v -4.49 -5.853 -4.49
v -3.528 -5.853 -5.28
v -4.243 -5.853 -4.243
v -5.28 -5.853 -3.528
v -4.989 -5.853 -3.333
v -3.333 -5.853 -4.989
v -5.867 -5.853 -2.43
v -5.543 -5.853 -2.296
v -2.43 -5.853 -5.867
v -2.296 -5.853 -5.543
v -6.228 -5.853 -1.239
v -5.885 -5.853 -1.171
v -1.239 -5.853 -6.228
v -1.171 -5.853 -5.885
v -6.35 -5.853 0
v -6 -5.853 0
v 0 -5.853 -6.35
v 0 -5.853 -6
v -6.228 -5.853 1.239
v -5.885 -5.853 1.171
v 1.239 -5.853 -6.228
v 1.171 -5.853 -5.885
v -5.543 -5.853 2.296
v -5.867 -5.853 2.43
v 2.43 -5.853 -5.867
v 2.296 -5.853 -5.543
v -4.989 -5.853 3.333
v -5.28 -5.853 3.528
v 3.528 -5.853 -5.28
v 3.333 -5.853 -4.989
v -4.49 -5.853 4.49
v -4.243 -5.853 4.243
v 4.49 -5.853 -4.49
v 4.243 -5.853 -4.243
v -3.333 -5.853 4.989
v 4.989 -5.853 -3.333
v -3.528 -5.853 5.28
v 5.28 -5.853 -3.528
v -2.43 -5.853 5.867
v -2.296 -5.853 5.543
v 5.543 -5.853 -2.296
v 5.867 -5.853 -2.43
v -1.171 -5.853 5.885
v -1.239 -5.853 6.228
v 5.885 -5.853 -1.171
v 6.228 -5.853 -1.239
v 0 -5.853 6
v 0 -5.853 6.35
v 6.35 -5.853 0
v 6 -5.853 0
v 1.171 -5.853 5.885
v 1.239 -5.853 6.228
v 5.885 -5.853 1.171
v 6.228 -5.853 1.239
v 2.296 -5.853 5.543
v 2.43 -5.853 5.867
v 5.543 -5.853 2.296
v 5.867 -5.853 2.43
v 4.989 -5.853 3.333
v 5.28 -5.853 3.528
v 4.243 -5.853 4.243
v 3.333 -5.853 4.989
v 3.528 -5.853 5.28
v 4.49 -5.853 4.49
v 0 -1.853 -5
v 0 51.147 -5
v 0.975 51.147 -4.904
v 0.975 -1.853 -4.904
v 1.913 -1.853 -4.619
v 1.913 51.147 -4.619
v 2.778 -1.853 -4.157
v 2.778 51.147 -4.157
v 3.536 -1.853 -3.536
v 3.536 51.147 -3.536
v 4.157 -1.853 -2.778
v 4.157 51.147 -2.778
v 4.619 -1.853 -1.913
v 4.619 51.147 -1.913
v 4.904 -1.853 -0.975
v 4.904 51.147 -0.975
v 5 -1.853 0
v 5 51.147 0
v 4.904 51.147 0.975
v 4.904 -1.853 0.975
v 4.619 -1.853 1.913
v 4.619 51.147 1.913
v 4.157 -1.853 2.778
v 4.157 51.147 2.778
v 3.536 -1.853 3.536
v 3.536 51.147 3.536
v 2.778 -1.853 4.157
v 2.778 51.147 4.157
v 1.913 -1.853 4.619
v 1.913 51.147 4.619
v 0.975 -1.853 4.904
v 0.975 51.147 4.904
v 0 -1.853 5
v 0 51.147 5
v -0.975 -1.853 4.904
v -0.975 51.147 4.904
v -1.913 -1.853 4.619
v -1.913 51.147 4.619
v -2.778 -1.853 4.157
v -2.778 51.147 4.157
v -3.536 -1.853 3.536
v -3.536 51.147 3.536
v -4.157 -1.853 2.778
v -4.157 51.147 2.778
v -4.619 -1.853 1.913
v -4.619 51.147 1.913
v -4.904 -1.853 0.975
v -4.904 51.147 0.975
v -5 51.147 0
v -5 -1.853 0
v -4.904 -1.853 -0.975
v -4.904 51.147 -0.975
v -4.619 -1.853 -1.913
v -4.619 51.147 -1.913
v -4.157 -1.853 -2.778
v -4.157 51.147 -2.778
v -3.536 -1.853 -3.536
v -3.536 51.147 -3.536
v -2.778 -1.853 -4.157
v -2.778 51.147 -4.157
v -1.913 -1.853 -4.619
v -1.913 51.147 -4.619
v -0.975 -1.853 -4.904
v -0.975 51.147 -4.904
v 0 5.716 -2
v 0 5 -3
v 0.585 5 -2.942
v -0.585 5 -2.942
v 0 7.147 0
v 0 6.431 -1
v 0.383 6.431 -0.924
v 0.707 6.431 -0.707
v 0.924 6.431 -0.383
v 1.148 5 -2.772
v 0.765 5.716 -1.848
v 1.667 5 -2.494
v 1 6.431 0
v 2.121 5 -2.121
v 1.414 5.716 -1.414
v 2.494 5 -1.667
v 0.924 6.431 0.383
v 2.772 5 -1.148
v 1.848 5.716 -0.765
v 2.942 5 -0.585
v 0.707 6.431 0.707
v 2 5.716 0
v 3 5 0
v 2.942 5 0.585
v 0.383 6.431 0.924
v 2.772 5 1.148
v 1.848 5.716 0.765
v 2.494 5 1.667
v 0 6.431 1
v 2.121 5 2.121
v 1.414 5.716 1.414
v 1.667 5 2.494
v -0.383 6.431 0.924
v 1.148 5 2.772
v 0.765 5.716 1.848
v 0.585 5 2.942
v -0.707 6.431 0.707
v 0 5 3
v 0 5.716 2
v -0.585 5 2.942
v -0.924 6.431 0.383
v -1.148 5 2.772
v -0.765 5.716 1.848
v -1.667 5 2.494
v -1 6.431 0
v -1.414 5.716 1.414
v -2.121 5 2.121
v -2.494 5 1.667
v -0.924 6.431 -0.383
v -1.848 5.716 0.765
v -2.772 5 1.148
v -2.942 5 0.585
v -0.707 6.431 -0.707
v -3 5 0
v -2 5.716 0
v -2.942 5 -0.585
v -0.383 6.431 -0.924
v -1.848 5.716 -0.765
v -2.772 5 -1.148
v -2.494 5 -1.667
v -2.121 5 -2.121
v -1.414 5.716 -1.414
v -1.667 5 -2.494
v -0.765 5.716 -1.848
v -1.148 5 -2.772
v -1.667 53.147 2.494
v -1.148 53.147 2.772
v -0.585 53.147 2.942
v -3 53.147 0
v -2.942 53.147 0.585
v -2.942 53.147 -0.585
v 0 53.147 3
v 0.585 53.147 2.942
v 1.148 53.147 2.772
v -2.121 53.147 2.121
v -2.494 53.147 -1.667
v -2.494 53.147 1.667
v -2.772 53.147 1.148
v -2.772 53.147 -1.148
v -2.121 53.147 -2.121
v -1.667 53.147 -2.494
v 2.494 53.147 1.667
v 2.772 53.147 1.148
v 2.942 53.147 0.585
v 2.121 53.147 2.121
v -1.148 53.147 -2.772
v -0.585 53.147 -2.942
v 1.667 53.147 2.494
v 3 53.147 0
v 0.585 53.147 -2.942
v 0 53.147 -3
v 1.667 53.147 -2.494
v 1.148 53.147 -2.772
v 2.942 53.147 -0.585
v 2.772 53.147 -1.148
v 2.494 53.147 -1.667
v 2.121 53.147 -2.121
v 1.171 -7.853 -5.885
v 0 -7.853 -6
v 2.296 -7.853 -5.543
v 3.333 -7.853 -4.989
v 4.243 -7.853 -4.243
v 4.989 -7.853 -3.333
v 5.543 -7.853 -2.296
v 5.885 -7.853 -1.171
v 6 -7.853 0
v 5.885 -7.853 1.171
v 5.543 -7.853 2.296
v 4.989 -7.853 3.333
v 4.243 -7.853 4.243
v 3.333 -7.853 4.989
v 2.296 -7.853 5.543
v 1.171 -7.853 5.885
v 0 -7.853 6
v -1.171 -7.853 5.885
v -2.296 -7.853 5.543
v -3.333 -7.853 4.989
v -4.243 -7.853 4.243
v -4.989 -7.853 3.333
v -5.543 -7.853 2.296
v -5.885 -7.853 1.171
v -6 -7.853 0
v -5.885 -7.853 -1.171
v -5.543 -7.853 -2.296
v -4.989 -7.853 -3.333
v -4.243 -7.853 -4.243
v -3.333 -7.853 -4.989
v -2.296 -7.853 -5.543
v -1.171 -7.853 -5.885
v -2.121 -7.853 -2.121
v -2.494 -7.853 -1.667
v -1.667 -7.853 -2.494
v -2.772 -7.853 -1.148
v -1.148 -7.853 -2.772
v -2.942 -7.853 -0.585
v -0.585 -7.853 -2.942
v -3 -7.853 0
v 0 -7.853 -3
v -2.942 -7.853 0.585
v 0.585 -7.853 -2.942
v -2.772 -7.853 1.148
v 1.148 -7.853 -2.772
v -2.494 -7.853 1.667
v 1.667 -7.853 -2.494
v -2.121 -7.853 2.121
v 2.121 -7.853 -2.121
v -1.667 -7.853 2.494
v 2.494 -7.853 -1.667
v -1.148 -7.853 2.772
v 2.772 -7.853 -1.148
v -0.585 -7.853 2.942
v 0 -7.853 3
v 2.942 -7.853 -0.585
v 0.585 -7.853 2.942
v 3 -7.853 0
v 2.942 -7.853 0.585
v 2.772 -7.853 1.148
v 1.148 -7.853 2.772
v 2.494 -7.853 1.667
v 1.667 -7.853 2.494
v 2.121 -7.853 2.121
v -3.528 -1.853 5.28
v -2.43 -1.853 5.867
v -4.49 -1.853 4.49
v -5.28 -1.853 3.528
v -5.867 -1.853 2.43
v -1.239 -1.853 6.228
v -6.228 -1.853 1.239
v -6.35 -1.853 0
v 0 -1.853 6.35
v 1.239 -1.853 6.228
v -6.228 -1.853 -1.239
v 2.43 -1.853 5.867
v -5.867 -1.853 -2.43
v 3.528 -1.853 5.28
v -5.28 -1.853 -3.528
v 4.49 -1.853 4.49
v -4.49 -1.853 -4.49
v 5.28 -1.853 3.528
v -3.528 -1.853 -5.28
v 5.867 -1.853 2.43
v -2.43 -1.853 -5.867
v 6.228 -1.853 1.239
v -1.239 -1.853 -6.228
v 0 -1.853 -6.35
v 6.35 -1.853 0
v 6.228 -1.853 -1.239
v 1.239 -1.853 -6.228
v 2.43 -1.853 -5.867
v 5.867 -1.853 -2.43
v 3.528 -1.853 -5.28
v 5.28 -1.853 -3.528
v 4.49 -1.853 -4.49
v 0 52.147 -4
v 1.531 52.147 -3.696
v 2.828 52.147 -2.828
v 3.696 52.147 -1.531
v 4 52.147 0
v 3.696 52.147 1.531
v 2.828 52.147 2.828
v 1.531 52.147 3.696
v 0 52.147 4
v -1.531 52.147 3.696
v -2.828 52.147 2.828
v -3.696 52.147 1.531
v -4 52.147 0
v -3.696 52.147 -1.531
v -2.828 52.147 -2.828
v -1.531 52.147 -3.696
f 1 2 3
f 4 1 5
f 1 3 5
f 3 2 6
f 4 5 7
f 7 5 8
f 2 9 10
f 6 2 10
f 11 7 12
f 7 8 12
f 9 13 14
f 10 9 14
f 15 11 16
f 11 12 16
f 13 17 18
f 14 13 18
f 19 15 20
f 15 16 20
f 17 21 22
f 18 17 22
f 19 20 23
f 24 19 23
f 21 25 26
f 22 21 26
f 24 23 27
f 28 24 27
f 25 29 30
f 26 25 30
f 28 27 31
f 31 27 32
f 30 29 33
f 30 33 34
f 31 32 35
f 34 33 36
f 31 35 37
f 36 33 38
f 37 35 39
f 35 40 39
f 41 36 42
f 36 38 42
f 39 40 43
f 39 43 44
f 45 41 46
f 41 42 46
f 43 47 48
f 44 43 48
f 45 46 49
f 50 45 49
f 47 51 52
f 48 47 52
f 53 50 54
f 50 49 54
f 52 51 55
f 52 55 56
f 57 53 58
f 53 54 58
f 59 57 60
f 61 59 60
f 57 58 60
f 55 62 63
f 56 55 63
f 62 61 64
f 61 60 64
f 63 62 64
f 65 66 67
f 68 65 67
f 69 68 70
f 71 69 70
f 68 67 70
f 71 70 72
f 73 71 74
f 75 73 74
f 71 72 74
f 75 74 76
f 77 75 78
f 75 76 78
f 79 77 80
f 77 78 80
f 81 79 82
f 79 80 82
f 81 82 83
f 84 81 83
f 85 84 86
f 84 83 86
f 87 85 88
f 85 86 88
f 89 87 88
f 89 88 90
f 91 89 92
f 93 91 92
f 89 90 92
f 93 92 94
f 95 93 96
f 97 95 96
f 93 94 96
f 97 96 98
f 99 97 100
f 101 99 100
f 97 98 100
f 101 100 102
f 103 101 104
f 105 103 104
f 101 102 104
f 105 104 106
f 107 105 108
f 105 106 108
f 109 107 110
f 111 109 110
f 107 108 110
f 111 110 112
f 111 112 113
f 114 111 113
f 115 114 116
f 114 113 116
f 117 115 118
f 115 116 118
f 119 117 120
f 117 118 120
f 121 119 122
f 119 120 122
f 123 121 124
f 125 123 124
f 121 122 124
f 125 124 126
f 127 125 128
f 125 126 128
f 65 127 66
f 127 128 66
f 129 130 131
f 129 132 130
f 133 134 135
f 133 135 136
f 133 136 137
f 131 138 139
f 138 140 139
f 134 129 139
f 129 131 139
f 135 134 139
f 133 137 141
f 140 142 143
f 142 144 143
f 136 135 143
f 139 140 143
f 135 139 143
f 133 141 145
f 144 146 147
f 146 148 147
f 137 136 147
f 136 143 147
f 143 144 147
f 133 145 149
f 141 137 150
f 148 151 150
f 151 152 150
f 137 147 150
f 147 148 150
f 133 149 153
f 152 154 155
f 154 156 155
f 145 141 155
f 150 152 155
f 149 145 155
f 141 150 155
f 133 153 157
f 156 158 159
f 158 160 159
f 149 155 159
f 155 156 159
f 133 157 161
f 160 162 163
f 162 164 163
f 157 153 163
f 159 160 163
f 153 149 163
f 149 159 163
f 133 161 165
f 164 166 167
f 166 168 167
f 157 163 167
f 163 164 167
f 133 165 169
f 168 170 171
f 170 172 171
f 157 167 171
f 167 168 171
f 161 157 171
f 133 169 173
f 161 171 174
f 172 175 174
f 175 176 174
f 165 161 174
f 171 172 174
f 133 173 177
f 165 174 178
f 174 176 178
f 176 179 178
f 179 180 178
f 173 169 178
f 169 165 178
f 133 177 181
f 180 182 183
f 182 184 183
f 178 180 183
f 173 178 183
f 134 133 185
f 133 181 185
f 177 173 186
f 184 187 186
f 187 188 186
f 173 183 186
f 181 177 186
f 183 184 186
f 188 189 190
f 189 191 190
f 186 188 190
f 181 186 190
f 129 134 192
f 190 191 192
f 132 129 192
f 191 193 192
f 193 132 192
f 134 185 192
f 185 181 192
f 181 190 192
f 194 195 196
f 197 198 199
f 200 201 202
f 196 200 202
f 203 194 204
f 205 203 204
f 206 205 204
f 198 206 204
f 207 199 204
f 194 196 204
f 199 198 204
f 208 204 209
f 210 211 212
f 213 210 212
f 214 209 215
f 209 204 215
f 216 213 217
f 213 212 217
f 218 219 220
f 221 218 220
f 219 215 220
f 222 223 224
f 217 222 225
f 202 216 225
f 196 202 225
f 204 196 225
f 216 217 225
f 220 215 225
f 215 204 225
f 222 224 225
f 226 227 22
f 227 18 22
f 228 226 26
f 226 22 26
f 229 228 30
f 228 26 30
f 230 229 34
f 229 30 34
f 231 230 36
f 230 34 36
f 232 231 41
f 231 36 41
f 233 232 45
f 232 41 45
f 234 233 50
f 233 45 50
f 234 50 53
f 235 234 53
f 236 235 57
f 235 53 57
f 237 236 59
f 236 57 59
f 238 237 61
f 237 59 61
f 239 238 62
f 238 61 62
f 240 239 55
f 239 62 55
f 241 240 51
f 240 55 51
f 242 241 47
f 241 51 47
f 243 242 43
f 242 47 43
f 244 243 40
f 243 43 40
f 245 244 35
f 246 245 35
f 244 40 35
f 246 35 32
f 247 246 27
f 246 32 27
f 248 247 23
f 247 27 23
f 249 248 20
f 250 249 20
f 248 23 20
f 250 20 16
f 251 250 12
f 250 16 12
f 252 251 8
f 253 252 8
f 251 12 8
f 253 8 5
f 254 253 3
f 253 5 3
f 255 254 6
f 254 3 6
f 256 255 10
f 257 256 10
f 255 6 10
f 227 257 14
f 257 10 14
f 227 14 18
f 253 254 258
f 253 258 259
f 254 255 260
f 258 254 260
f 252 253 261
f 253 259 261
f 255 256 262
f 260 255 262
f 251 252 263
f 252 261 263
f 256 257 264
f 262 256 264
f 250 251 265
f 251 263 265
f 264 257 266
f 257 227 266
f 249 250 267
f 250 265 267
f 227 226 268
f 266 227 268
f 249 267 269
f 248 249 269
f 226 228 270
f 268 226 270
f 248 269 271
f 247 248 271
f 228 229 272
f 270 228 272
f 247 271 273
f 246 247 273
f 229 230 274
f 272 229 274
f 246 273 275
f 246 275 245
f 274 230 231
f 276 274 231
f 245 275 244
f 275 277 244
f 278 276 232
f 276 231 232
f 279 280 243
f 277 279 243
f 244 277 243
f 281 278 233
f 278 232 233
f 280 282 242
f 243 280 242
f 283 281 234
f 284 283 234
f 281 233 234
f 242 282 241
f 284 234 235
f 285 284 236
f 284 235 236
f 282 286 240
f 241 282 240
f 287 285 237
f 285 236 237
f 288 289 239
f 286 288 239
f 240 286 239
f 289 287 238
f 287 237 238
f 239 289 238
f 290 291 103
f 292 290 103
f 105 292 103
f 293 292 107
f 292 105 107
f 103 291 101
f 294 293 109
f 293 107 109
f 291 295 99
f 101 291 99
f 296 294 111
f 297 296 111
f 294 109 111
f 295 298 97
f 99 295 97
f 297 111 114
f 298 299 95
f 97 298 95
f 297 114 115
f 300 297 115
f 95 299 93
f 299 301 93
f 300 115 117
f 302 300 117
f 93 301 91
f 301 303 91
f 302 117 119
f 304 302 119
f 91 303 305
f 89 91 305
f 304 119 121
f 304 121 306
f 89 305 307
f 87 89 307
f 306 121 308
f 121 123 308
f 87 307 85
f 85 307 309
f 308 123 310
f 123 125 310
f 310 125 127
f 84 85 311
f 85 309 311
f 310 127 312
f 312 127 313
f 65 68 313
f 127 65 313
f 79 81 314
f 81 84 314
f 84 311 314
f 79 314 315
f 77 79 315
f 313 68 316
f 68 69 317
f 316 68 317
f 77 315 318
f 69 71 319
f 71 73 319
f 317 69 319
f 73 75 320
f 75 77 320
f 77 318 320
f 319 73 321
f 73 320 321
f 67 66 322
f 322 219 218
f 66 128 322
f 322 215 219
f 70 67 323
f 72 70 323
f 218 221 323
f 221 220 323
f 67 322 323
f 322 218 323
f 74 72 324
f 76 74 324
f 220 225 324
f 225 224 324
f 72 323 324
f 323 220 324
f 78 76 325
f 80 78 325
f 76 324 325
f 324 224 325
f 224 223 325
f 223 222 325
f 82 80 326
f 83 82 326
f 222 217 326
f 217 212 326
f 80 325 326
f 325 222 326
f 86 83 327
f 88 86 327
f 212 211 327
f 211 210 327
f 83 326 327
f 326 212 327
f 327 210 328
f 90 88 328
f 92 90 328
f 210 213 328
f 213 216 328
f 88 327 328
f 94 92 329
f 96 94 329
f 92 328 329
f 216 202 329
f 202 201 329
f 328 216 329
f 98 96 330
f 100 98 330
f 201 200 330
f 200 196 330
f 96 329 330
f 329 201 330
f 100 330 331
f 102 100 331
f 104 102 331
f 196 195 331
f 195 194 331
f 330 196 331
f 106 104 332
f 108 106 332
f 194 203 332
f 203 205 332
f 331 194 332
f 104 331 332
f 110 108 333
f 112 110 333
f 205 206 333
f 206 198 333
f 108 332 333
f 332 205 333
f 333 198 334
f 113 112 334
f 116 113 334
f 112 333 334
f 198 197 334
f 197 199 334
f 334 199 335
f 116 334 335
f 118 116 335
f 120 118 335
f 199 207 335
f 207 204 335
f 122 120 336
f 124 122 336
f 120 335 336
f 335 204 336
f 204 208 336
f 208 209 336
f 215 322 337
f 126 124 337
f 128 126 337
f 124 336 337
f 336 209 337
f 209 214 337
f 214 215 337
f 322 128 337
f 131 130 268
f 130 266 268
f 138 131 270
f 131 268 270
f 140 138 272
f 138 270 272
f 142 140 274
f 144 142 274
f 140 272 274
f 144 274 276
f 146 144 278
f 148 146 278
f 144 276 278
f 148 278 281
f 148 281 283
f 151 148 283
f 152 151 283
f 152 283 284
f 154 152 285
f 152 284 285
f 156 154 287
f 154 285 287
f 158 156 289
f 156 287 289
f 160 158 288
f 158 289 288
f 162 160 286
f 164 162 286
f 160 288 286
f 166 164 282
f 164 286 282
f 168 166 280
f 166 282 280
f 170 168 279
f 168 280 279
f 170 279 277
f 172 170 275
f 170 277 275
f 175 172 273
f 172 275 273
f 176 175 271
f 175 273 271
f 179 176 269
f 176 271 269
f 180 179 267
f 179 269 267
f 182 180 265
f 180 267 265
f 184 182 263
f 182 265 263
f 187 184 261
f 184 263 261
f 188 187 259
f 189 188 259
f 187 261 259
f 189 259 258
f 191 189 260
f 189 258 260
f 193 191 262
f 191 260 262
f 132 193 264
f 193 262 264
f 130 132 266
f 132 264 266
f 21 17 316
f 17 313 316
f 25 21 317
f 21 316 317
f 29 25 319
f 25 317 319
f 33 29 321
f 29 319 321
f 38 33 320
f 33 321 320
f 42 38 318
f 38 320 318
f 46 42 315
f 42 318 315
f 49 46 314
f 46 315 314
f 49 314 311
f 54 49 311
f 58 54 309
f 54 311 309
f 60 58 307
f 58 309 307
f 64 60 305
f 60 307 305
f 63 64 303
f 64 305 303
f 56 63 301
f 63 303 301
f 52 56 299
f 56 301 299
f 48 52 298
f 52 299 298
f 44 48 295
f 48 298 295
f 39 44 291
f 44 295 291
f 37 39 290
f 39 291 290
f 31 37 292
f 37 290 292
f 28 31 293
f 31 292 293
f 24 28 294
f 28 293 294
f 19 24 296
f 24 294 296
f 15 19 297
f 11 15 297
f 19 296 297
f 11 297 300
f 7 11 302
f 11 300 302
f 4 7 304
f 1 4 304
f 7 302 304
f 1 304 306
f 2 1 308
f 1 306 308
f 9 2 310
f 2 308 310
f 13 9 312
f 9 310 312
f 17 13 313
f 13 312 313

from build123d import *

# Parameters (mm, degrees)
F3_SIZE2 = 2
F3_SIZE  = 2


# Not quite as in the source:
# - a feature names something its author has since deleted; it is built from what else it names


with BuildPart() as f1:
    # F0 (on Right) → F1 (revolve)
    with BuildSketch(Plane.YZ):
        Polygon((-7.8531129844, -6), (-5.8531129844, -6), (-5.8531129844, -6.35), (-1.8531129844, -6.35), (-1.8531129844, -5), (45.1962463558, -5), (53.1468870156, -5), (53.1468870156, 0), (7.1468870156, 0), (5, -3), (-7.8531129844, -3), (-7.8531129844, -5.5), align=None)
    revolve(axis=Axis((0, 30.1468870156, 0), (0, -1, 0)))

    # F3
    f3_edges = [f1.edges().sort_by_distance(p)[0] for p in [
        (0, 53.146887, 5),
    ]]
    chamfer(f3_edges, length=F3_SIZE, length2=F3_SIZE2)


solid = f1.part
